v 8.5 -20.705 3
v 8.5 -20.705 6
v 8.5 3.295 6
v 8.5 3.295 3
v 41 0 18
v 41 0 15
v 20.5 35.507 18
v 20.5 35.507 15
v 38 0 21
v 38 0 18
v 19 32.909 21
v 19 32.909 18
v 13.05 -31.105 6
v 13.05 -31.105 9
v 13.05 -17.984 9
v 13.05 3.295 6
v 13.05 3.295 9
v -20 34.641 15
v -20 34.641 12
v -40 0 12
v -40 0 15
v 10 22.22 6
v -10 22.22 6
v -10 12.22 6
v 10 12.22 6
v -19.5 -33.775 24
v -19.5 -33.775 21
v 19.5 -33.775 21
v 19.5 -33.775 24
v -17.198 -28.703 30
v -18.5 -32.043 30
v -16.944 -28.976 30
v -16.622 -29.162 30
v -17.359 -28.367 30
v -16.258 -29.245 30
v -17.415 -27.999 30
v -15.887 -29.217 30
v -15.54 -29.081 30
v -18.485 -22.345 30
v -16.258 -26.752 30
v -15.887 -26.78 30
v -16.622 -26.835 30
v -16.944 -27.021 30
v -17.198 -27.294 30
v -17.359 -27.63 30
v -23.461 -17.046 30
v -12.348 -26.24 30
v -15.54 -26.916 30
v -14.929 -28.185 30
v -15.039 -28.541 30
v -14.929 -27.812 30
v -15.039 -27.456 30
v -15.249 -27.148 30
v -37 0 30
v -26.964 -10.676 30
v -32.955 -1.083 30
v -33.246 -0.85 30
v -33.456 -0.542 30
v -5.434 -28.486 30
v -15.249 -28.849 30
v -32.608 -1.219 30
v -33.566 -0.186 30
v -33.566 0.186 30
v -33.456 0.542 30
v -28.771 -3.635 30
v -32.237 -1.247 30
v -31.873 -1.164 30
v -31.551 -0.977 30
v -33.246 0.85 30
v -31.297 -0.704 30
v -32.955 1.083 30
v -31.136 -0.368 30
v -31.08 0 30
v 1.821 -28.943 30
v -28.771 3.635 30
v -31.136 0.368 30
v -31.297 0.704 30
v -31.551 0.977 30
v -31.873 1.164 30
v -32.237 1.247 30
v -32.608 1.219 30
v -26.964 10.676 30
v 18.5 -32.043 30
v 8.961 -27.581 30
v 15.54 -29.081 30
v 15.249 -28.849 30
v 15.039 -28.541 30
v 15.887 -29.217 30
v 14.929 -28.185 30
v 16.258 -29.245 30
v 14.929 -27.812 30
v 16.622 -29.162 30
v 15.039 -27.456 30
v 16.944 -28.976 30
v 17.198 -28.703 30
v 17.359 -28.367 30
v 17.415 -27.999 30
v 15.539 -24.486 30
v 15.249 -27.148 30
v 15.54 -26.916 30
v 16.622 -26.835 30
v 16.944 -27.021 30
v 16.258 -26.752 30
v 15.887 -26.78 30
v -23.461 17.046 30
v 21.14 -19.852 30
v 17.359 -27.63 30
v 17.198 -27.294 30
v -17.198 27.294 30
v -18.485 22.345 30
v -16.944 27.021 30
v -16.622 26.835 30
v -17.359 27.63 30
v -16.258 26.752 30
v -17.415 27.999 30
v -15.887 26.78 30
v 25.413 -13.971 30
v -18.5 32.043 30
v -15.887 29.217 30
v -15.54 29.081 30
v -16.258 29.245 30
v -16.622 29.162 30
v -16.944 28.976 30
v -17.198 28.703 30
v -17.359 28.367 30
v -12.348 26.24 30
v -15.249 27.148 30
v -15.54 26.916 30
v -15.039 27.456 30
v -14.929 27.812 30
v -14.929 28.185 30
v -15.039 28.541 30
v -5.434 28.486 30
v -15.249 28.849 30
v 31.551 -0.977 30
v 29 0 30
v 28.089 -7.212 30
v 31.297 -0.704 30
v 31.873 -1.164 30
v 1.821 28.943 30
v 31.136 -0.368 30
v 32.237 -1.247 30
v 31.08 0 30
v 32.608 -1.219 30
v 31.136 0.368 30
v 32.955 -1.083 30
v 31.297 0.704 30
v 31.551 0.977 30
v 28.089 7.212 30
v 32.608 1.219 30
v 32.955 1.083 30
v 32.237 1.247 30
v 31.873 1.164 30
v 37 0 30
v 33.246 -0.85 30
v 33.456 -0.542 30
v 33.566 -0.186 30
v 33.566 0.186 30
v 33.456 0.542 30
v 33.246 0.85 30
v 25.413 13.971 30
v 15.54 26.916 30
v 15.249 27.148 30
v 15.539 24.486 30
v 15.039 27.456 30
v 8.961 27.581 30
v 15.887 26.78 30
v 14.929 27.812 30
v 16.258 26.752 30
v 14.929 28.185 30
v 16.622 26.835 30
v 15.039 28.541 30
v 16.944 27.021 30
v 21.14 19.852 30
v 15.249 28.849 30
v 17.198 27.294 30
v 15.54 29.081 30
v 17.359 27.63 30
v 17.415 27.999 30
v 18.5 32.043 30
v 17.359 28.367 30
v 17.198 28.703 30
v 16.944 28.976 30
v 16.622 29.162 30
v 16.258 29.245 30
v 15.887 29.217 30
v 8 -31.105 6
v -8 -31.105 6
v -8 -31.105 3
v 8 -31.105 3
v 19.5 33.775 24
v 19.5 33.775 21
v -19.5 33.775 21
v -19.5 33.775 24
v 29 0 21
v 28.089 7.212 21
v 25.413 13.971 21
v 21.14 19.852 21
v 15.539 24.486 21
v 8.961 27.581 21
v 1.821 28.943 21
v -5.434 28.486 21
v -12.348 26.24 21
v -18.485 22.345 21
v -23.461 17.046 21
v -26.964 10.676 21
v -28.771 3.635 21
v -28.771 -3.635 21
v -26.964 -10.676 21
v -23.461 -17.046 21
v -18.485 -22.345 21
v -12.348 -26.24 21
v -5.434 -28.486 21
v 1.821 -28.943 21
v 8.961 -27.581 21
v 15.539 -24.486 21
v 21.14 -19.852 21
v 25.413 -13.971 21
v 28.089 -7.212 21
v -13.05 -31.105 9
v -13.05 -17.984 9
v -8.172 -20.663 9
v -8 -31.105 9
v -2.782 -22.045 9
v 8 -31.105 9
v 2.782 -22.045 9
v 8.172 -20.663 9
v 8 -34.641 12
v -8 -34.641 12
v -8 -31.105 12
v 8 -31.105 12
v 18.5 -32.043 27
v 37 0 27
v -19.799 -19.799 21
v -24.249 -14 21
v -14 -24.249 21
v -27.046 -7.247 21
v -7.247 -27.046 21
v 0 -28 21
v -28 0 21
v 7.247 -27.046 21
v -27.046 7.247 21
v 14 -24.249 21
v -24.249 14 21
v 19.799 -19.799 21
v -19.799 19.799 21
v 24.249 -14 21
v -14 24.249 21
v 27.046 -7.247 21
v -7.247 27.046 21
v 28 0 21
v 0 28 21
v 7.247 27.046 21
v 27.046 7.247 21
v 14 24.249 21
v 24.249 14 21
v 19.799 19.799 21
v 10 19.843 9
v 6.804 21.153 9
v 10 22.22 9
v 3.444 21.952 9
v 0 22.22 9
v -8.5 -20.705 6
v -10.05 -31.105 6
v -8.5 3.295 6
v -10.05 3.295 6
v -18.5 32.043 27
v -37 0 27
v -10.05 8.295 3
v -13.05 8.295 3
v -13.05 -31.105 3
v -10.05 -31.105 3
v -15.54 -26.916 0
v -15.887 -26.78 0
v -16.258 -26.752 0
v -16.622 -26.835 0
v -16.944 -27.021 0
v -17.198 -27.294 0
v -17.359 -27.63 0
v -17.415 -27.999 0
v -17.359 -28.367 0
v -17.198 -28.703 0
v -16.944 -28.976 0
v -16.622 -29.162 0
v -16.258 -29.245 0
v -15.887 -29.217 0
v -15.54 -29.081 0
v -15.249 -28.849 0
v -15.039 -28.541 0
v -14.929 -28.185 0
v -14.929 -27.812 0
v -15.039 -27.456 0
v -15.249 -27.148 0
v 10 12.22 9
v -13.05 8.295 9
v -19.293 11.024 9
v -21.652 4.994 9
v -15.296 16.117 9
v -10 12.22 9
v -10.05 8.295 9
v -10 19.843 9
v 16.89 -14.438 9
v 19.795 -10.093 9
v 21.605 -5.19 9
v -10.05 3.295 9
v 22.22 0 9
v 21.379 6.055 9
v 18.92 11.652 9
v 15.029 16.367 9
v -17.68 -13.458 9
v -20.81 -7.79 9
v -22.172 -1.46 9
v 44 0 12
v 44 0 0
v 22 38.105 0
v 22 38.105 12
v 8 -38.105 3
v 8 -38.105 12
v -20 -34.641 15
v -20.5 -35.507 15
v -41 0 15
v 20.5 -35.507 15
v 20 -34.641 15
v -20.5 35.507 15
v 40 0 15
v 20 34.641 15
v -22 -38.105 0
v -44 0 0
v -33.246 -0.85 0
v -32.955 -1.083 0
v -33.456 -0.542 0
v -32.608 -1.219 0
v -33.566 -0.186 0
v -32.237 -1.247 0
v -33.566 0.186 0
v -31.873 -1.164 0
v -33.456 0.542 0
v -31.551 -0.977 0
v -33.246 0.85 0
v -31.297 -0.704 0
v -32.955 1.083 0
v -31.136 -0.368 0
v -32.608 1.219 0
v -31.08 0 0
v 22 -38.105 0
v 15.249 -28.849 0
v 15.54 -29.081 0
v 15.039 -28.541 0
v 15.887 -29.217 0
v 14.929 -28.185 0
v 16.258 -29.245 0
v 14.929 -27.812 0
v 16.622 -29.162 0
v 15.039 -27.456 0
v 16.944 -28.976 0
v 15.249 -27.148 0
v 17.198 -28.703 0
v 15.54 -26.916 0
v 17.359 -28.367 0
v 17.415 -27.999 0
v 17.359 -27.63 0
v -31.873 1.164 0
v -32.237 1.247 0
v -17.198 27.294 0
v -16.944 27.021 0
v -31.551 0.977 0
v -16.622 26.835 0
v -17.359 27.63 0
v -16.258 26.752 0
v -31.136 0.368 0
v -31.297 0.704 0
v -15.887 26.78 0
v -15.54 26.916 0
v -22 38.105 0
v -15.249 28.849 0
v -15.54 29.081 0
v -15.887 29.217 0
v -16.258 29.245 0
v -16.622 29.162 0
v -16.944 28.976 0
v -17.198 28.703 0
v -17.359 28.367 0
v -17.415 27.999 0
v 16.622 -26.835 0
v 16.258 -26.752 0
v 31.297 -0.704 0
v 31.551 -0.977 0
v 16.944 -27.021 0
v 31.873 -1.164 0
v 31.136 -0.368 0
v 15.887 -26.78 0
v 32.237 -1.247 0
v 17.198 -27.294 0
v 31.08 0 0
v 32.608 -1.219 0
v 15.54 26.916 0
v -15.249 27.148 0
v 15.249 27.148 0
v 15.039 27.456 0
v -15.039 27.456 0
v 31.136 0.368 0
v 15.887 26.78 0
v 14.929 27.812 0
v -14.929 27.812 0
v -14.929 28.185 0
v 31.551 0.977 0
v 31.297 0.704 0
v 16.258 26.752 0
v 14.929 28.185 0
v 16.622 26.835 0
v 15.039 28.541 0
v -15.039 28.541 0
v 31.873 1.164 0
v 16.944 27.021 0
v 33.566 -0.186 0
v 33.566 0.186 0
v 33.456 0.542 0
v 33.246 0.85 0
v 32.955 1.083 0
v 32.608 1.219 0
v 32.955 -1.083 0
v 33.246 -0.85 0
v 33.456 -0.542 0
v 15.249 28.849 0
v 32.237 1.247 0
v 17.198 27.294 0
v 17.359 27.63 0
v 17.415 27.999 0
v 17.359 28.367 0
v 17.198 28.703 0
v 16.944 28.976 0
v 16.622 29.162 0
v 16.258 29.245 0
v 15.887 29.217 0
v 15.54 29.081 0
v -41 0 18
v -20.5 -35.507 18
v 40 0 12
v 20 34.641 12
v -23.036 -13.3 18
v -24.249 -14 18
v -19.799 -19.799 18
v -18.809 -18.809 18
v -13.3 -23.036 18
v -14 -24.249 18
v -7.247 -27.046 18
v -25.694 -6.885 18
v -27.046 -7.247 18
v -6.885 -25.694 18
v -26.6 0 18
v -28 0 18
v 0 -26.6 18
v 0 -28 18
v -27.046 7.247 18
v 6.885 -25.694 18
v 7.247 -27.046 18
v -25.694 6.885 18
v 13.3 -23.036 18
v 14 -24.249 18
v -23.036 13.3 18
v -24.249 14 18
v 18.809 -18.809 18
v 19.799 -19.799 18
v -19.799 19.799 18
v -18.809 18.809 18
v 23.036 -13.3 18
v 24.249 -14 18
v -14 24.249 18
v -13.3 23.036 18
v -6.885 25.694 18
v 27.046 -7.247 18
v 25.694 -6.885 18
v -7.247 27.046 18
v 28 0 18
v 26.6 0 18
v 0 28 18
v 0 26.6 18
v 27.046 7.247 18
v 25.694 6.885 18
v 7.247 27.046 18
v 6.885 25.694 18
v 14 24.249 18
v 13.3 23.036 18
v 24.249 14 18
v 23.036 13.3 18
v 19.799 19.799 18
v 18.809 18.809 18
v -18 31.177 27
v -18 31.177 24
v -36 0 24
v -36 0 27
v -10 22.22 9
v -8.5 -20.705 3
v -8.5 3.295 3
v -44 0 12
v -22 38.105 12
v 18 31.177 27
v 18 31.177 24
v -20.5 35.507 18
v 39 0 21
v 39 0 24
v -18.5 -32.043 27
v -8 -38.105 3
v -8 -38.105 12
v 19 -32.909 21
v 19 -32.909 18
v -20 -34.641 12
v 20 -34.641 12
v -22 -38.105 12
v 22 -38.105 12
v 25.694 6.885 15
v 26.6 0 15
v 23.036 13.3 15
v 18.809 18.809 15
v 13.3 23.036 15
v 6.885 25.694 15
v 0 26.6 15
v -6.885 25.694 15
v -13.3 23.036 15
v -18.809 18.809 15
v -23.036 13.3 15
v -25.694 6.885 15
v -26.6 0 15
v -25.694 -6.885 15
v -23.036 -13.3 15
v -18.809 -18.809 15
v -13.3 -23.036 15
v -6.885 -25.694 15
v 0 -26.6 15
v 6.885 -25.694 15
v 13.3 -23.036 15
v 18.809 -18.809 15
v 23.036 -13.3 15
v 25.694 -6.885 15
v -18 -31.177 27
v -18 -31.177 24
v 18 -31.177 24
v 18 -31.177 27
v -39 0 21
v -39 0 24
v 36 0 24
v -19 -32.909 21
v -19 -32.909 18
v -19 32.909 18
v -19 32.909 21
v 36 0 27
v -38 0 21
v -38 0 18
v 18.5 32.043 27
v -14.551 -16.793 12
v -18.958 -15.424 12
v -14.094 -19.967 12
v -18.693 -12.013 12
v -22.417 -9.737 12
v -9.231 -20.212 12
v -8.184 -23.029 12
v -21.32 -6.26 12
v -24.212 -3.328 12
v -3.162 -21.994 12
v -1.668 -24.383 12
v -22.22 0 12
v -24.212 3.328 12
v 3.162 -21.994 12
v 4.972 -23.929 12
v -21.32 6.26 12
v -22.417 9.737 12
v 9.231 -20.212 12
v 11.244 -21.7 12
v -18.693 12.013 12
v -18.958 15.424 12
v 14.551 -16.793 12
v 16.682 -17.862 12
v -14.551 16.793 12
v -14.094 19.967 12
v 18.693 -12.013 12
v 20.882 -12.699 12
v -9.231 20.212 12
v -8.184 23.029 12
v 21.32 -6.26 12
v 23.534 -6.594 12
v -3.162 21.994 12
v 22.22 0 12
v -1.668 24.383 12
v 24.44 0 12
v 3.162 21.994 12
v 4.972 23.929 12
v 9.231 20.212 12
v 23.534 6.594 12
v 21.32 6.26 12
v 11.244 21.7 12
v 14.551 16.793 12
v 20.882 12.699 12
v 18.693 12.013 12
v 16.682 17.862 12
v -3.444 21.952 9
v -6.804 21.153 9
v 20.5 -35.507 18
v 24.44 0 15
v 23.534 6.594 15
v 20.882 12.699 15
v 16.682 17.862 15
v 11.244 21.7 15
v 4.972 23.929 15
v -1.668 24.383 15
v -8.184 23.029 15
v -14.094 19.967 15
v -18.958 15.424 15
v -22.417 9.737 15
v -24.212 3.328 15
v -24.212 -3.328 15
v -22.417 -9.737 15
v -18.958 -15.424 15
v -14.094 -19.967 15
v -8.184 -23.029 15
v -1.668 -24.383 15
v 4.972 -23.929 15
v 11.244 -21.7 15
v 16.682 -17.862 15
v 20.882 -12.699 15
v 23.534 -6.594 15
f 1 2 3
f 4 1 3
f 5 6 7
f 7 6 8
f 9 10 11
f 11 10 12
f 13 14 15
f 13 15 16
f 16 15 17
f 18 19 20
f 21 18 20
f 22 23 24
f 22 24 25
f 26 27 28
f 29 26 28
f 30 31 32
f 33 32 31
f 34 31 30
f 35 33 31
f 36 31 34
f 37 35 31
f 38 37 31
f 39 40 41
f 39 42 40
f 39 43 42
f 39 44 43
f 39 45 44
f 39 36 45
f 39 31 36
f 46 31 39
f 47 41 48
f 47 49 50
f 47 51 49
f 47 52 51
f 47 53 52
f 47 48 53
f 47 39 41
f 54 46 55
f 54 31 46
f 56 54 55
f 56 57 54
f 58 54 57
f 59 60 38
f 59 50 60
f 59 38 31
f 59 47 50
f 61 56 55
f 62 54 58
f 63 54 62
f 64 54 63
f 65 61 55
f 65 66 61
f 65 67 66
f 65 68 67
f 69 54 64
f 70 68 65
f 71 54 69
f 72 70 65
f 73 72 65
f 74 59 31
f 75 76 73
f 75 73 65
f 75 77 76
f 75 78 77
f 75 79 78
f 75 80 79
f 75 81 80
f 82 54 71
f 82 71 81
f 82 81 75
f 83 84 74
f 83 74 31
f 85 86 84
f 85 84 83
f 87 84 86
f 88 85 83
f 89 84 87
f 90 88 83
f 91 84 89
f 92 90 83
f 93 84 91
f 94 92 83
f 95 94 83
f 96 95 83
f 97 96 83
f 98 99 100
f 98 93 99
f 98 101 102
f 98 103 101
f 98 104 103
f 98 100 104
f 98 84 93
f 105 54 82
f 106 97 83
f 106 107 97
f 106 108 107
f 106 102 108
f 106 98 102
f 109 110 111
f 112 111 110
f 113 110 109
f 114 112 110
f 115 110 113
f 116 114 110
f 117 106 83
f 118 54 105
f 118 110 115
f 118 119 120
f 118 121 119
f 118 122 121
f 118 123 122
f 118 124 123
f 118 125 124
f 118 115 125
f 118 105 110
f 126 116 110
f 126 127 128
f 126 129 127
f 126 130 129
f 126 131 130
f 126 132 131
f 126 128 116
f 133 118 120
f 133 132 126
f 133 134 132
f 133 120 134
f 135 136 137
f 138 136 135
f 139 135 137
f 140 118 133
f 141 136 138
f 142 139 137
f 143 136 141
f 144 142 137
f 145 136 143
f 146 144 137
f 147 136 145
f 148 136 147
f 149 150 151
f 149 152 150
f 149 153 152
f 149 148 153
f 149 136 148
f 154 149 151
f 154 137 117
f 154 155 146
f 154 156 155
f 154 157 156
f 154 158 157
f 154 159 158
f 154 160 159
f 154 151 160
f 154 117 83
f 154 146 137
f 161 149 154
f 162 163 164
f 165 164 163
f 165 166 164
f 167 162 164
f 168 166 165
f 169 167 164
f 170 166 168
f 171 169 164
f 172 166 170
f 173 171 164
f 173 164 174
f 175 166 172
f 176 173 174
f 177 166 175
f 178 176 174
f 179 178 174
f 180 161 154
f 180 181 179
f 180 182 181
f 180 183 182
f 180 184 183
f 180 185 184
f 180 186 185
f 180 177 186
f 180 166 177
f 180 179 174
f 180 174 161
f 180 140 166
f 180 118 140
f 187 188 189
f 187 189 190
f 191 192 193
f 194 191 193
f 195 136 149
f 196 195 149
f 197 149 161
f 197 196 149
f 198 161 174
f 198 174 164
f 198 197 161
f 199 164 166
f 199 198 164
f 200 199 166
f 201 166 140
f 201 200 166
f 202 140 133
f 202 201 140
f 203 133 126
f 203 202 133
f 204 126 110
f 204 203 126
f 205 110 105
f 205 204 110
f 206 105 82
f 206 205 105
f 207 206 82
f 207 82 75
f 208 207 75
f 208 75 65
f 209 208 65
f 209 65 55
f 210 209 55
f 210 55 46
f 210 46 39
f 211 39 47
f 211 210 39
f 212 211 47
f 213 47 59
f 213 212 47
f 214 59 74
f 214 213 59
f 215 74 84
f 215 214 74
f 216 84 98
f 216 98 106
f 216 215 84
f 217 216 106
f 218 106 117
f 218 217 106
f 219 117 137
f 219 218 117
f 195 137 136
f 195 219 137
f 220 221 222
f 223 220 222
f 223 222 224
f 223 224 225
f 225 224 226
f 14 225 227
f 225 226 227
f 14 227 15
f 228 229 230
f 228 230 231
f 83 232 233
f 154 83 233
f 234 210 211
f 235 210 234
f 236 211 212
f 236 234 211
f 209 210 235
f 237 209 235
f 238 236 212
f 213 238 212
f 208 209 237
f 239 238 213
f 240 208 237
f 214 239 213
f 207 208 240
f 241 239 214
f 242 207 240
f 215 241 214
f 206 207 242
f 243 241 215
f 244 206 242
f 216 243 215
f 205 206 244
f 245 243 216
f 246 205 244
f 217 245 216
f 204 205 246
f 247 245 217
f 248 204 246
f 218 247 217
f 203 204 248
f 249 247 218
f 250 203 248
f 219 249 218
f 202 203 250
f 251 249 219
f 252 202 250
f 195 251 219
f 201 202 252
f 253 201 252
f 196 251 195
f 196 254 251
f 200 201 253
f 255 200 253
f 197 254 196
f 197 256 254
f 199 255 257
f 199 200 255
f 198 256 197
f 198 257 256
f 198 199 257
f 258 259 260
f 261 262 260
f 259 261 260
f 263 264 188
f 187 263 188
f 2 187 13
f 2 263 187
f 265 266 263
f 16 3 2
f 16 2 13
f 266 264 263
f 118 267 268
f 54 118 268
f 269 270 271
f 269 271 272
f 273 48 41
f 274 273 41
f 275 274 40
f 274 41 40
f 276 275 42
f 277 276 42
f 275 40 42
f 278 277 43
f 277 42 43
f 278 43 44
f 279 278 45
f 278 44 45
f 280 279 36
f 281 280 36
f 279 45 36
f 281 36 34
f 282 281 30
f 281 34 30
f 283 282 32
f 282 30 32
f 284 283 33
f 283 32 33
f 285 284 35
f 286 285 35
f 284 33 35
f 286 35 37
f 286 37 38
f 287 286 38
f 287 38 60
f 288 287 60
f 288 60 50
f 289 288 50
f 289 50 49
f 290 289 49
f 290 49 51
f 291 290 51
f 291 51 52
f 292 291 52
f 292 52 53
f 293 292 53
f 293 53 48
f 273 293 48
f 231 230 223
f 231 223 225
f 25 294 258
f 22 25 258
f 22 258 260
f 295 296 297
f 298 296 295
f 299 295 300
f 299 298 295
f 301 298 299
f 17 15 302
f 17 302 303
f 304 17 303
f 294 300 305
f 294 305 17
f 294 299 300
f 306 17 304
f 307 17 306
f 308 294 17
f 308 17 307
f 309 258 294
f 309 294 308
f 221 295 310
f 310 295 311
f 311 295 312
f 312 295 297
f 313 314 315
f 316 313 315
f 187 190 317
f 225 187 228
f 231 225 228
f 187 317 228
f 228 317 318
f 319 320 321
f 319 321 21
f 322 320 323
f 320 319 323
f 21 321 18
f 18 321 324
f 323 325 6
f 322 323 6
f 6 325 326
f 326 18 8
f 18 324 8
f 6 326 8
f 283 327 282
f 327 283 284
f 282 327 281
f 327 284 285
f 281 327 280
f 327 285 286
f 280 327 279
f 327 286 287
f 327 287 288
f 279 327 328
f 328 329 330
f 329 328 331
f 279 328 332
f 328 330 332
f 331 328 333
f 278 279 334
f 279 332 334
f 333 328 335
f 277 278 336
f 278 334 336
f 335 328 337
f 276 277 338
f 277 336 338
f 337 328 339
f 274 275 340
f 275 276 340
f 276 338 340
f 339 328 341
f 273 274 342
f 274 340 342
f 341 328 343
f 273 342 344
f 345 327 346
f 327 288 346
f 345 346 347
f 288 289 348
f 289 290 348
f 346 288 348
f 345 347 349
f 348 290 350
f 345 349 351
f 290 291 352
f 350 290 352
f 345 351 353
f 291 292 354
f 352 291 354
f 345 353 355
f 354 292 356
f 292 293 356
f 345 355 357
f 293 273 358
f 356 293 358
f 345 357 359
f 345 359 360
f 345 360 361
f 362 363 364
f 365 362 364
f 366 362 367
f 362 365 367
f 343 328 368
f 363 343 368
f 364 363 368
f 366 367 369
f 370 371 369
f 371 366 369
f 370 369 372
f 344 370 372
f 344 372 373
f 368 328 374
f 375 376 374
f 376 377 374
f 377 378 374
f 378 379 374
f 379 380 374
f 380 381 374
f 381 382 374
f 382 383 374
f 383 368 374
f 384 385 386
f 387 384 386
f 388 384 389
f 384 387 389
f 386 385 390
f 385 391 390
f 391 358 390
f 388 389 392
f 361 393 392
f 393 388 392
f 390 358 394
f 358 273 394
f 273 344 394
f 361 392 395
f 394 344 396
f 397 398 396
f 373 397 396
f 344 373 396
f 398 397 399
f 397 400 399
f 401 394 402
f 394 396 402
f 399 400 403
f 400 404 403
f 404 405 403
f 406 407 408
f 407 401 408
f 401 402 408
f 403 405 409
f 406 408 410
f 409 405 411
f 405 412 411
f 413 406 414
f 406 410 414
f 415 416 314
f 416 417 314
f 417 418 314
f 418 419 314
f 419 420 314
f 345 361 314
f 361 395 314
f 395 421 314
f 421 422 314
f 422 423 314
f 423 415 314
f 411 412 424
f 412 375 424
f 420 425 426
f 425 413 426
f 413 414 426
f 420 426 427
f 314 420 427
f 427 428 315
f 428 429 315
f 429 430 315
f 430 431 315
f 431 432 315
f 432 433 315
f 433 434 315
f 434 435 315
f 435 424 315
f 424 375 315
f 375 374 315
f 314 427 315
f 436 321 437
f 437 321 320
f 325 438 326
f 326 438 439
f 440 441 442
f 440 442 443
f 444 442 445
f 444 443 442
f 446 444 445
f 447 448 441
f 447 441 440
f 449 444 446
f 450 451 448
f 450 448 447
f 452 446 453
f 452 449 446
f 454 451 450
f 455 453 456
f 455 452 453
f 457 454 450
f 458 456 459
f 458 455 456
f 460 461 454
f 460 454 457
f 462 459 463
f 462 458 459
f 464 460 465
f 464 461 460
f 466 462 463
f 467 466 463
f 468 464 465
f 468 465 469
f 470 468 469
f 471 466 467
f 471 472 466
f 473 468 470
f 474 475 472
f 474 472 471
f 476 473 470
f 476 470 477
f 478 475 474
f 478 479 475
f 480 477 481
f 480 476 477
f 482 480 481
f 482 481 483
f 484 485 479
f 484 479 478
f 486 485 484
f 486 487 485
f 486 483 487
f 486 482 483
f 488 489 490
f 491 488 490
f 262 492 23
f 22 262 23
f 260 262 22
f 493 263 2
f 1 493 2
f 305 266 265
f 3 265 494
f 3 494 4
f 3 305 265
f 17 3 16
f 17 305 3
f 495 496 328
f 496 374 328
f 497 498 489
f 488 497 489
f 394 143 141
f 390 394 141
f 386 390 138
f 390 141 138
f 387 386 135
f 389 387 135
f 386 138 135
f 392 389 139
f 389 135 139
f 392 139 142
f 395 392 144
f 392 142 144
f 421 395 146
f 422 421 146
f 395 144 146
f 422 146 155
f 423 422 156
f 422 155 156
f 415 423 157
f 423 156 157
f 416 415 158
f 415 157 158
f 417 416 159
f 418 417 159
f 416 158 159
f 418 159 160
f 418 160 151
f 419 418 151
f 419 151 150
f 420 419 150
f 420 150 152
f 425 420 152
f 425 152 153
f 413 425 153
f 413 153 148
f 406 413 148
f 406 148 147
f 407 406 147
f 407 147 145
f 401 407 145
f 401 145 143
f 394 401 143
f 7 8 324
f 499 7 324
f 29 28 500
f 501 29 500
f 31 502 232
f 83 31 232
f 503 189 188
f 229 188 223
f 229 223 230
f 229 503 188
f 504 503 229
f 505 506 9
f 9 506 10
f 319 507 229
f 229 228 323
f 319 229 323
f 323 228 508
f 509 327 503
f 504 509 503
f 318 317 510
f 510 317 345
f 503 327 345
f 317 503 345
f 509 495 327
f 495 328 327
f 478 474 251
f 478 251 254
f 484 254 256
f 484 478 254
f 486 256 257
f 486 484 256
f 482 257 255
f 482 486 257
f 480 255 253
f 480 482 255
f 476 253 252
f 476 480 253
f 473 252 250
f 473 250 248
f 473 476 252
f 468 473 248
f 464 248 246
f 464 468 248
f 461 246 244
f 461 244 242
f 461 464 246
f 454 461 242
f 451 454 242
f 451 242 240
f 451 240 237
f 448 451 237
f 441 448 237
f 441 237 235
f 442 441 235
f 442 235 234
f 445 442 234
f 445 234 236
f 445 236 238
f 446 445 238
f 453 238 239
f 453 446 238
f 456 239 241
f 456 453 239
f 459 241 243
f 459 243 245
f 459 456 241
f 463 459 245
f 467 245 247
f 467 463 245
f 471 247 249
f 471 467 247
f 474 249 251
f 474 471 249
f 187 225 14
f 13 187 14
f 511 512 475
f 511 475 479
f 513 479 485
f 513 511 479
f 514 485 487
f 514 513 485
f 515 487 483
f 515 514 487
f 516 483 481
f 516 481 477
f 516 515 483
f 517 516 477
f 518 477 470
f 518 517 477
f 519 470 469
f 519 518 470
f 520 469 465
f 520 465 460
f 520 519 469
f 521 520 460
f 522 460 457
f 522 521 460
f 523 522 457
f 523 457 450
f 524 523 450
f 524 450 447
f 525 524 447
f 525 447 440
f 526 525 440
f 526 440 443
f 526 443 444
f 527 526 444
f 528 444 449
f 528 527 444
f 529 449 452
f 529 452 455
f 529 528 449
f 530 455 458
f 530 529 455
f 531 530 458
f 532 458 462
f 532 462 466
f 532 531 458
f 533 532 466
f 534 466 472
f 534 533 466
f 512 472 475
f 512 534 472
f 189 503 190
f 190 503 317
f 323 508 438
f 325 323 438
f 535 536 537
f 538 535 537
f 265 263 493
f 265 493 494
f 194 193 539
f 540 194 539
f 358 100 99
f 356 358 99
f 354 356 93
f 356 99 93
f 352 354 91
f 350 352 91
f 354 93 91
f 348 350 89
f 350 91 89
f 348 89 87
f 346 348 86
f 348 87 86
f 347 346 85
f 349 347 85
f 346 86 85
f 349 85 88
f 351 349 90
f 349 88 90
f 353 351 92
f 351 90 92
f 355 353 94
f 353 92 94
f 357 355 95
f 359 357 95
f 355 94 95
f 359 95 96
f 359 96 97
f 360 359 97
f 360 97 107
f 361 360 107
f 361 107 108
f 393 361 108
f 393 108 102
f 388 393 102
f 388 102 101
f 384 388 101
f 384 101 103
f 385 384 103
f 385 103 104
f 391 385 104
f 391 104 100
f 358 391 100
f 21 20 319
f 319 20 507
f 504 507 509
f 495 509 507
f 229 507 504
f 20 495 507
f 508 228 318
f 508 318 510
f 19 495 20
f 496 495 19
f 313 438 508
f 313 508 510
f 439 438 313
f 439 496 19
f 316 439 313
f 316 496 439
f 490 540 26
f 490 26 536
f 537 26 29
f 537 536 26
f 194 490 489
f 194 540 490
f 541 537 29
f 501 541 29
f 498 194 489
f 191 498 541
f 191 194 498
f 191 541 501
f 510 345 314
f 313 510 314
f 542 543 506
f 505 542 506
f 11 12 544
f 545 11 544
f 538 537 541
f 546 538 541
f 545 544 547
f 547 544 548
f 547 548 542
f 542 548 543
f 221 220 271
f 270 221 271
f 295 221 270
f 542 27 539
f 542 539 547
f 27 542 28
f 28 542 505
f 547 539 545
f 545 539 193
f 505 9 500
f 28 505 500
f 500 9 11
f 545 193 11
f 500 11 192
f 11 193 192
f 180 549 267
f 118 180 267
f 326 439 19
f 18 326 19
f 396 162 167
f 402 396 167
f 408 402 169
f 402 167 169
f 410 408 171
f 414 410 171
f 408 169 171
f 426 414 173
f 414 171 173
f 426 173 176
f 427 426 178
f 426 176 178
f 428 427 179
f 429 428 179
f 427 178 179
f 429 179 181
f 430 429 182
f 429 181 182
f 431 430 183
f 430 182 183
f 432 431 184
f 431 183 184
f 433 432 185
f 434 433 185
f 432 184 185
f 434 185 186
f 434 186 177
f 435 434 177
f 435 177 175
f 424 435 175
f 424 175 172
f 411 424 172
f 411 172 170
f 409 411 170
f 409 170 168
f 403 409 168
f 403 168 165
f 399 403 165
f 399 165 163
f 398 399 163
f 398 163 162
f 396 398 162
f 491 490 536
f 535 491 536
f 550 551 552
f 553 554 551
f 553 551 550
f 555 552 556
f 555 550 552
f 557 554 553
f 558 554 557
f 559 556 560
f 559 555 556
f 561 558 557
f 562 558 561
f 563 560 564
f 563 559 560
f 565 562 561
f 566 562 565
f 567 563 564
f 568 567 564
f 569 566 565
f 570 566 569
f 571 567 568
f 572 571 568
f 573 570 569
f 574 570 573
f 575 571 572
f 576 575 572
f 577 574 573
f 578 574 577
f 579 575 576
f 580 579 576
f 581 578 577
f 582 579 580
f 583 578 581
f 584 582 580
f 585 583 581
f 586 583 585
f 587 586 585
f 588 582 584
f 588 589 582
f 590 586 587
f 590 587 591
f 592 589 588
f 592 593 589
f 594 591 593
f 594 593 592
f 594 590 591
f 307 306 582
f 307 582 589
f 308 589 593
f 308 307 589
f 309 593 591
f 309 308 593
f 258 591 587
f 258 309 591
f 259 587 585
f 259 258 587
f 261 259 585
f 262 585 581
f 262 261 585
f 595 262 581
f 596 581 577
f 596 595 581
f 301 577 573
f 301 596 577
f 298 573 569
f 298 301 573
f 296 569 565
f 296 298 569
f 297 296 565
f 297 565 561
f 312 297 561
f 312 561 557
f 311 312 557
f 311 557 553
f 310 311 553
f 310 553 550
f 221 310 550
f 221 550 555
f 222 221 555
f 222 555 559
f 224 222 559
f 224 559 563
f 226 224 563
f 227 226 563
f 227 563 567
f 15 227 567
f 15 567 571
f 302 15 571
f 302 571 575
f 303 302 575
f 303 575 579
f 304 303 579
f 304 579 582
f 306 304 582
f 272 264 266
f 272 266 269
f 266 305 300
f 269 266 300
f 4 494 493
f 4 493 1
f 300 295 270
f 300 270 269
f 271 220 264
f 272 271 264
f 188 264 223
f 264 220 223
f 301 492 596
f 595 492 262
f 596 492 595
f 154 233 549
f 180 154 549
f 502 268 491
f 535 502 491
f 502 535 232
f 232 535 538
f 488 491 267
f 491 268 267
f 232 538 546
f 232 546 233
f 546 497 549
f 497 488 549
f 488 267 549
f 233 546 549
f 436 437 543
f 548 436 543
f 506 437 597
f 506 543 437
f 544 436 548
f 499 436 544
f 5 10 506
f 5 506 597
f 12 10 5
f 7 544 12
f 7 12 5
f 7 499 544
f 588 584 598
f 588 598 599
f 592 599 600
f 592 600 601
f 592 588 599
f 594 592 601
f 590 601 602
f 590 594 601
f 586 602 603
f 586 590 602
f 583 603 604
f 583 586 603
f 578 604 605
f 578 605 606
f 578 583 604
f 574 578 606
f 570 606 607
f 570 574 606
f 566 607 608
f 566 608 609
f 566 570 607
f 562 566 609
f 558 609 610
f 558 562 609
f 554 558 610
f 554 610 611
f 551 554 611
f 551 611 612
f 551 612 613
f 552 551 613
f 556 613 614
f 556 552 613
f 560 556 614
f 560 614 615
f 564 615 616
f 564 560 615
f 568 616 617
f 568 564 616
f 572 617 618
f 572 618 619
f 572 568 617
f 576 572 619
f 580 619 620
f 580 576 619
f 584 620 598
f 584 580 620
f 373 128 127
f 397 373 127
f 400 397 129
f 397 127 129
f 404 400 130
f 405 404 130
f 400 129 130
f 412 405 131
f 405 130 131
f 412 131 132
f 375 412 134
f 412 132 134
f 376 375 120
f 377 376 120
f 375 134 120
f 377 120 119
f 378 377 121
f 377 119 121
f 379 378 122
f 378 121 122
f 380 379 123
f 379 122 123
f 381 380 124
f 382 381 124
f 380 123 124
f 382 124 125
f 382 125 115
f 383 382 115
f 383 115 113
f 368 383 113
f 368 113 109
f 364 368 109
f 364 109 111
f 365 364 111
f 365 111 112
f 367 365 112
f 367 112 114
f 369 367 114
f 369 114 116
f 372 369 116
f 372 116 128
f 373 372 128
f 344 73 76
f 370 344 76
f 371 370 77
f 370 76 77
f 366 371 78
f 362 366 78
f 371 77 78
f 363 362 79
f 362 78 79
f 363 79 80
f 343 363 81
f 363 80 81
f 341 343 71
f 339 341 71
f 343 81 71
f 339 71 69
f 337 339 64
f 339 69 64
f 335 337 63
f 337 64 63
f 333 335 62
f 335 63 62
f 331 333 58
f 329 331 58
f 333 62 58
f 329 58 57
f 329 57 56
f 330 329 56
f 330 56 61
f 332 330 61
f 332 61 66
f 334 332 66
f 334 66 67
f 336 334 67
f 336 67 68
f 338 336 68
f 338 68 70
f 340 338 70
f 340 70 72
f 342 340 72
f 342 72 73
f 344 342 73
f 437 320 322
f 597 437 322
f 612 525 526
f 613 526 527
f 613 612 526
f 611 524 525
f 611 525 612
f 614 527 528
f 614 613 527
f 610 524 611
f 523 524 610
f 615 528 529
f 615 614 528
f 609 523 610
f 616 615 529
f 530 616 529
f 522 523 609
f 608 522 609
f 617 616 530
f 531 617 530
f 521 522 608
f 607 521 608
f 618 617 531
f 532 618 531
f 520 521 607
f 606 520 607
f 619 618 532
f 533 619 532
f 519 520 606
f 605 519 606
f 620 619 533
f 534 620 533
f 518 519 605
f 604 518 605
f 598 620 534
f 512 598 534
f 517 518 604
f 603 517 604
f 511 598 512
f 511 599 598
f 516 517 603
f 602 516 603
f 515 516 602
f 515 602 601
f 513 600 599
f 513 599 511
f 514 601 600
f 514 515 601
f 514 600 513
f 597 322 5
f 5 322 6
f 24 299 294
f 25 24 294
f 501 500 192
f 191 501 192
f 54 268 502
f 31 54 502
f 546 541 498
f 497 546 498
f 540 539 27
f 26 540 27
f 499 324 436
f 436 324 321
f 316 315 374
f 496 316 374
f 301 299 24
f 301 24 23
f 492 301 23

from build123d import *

# Parameters (mm, degrees)
PAD_DEPTH          = 9
SKETCH001_W        = 26.1
SKETCH001_H        = 34.4
POCKET_DEPTH       = 3
SKETCH002_R        = 22.22
PAD001_DEPTH       = 3
SKETCH003_R        = 24.44
PAD002_DEPTH       = 3
SKETCH004_R        = 26.6
PAD003_DEPTH       = 3
SKETCH005_R        = 28
PAD004_DEPTH       = 3
SKETCH006_R        = 29
PAD005_DEPTH       = 3
SKETCH007_R        = 29
PAD006_DEPTH       = 3
SKETCH008_R        = 29
PAD007_DEPTH       = 3
SKETCH009_W        = 17
SKETCH009_H        = 24
POCKET001_DEPTH    = 3
SKETCH010_W        = 16
SKETCH010_H        = 9
POCKET002_DEPTH    = 7
SKETCH011_W        = 20
SKETCH011_H        = 10
POCKET003_DEPTH    = 3
SKETCH012_R        = 1.25
POCKET004_DEPTH    = 270.433943
POLARPATTERN_COUNT = 6
SKETCH013_W        = 3
SKETCH013_H        = 38
POCKET005_DEPTH    = 3
SKETCH014_W        = 3
SKETCH014_H        = 5
POCKET006_DEPTH    = 6


with BuildPart() as part:
    # Sketch → Pad (new body)
    with BuildSketch(Plane.XY):
        Polygon((44, 0), (22, 38.105118), (-22, 38.105118), (-44, 0), (-22, -38.105118), (22, -38.105118), align=None)
    extrude(amount=PAD_DEPTH)

    # Sketch001 (on Face8 of Pad) → Pocket (cut)
    with BuildSketch(Plane.XY.offset(9)):
        with Locations((0, -13.905118)):
            Rectangle(SKETCH001_W, SKETCH001_H)
    extrude(amount=-POCKET_DEPTH, mode=Mode.SUBTRACT)

    # Sketch002 (on Face5 of Pocket) → Pad001 (join)
    with BuildSketch(Plane.XY.offset(9)):
        Polygon((22, 38.105118), (-22, 38.105118), (-44, 0), (-22, -38.105118), (22, -38.105118), (44, 0), align=None)
        Circle(SKETCH002_R, mode=Mode.SUBTRACT)
    extrude(amount=PAD001_DEPTH)

    # Sketch003 (on Face14 of Pad001) → Pad002 (join)
    with BuildSketch(Plane.XY.offset(12)):
        Polygon((40, 0), (20, 34.641016), (-20, 34.641016), (-40, 0), (-20, -34.641016), (20, -34.641016), align=None)
        Circle(SKETCH003_R, mode=Mode.SUBTRACT)
    extrude(amount=PAD002_DEPTH)

    # Sketch004 (on Face21 of Pad002) → Pad003 (join)
    with BuildSketch(Plane.XY.offset(15)):
        Polygon((41, 0), (20.5, 35.507042), (-20.5, 35.507042), (-41, 0), (-20.5, -35.507042), (20.5, -35.507042), align=None)
        Circle(SKETCH004_R, mode=Mode.SUBTRACT)
    extrude(amount=PAD003_DEPTH)

    # Sketch005 (on Face28 of Pad003) → Pad004 (join)
    with BuildSketch(Plane.XY.offset(18)):
        Polygon((19, 32.908965), (-19, 32.908965), (-38, 0), (-19, -32.908965), (19, -32.908965), (38, 0), align=None)
        Circle(SKETCH005_R, mode=Mode.SUBTRACT)
    extrude(amount=PAD004_DEPTH)

    # Sketch006 (on Face35 of Pad004) → Pad005 (join)
    with BuildSketch(Plane.XY.offset(21)):
        Polygon((39, 0), (19.5, 33.774991), (-19.5, 33.774991), (-39, 0), (-19.5, -33.774991), (19.5, -33.774991), align=None)
        Circle(SKETCH006_R, mode=Mode.SUBTRACT)
    extrude(amount=PAD005_DEPTH)

    # Sketch007 (on Face42 of Pad005) → Pad006 (join)
    with BuildSketch(Plane.XY.offset(24)):
        Polygon((36, 0), (18, 31.176915), (-18, 31.176915), (-36, 0), (-18, -31.176915), (18, -31.176915), align=None)
        Circle(SKETCH007_R, mode=Mode.SUBTRACT)
    extrude(amount=PAD006_DEPTH)

    # Sketch008 (on Face49 of Pad006) → Pad007 (join)
    with BuildSketch(Plane.XY.offset(27)):
        Polygon((37, 0), (18.5, 32.04294), (-18.5, 32.04294), (-37, 0), (-18.5, -32.04294), (18.5, -32.04294), align=None)
        Circle(SKETCH008_R, mode=Mode.SUBTRACT)
    extrude(amount=PAD007_DEPTH)

    # Sketch009 (on Face74 of Pad007) → Pocket001 (cut)
    with BuildSketch(Plane.XY.offset(6)):
        with Locations((0, -8.705118)):
            Rectangle(SKETCH009_W, SKETCH009_H)
    extrude(amount=-POCKET001_DEPTH, mode=Mode.SUBTRACT)

    # Sketch010 (on Face12 of Pocket001) → Pocket002 (cut)
    with BuildSketch(Plane.XZ.offset(38.105118)):
        with Locations((0, 7.5)):
            Rectangle(SKETCH010_W, SKETCH010_H)
    extrude(amount=-POCKET002_DEPTH, mode=Mode.SUBTRACT)

    # Sketch011 (on Face40 of Pocket002) → Pocket003 (cut)
    with BuildSketch(Plane.XY.offset(9)):
        with Locations((0, 17.22)):
            Rectangle(SKETCH011_W, SKETCH011_H)
    extrude(amount=-POCKET003_DEPTH, mode=Mode.SUBTRACT)

    # Sketch012 (on Face93 of Pocket003) → Pocket004 (cut, through all)
    with BuildSketch(Plane.XY.offset(30)):
        with Locations((-32.33, 0)):
            Circle(SKETCH012_R)
    pocket004 = extrude(amount=-POCKET004_DEPTH, mode=Mode.SUBTRACT)

    # PolarPattern: Pocket004 ×6 about axis
    polarpattern_axis = Axis((0, 0, 30), (0, 0, 1))
    for i in range(1, POLARPATTERN_COUNT):
        add(pocket004.rotate(polarpattern_axis, i * 360 / POLARPATTERN_COUNT), mode=Mode.SUBTRACT)

    # Sketch013 (on Face45 of PolarPattern) → Pocket005 (cut)
    with BuildSketch(Plane.XY.offset(6)):
        with Locations((-11.55, -12.105118)):
            Rectangle(SKETCH013_W, SKETCH013_H)
    extrude(amount=-POCKET005_DEPTH, mode=Mode.SUBTRACT)

    # Sketch014 (on Face58 of Pocket005) → Pocket006 (cut)
    with BuildSketch(Plane.XY.offset(9)):
        with Locations((-11.55, 5.794882)):
            Rectangle(SKETCH014_W, SKETCH014_H)
    extrude(amount=-POCKET006_DEPTH, mode=Mode.SUBTRACT)


solid = part.part
